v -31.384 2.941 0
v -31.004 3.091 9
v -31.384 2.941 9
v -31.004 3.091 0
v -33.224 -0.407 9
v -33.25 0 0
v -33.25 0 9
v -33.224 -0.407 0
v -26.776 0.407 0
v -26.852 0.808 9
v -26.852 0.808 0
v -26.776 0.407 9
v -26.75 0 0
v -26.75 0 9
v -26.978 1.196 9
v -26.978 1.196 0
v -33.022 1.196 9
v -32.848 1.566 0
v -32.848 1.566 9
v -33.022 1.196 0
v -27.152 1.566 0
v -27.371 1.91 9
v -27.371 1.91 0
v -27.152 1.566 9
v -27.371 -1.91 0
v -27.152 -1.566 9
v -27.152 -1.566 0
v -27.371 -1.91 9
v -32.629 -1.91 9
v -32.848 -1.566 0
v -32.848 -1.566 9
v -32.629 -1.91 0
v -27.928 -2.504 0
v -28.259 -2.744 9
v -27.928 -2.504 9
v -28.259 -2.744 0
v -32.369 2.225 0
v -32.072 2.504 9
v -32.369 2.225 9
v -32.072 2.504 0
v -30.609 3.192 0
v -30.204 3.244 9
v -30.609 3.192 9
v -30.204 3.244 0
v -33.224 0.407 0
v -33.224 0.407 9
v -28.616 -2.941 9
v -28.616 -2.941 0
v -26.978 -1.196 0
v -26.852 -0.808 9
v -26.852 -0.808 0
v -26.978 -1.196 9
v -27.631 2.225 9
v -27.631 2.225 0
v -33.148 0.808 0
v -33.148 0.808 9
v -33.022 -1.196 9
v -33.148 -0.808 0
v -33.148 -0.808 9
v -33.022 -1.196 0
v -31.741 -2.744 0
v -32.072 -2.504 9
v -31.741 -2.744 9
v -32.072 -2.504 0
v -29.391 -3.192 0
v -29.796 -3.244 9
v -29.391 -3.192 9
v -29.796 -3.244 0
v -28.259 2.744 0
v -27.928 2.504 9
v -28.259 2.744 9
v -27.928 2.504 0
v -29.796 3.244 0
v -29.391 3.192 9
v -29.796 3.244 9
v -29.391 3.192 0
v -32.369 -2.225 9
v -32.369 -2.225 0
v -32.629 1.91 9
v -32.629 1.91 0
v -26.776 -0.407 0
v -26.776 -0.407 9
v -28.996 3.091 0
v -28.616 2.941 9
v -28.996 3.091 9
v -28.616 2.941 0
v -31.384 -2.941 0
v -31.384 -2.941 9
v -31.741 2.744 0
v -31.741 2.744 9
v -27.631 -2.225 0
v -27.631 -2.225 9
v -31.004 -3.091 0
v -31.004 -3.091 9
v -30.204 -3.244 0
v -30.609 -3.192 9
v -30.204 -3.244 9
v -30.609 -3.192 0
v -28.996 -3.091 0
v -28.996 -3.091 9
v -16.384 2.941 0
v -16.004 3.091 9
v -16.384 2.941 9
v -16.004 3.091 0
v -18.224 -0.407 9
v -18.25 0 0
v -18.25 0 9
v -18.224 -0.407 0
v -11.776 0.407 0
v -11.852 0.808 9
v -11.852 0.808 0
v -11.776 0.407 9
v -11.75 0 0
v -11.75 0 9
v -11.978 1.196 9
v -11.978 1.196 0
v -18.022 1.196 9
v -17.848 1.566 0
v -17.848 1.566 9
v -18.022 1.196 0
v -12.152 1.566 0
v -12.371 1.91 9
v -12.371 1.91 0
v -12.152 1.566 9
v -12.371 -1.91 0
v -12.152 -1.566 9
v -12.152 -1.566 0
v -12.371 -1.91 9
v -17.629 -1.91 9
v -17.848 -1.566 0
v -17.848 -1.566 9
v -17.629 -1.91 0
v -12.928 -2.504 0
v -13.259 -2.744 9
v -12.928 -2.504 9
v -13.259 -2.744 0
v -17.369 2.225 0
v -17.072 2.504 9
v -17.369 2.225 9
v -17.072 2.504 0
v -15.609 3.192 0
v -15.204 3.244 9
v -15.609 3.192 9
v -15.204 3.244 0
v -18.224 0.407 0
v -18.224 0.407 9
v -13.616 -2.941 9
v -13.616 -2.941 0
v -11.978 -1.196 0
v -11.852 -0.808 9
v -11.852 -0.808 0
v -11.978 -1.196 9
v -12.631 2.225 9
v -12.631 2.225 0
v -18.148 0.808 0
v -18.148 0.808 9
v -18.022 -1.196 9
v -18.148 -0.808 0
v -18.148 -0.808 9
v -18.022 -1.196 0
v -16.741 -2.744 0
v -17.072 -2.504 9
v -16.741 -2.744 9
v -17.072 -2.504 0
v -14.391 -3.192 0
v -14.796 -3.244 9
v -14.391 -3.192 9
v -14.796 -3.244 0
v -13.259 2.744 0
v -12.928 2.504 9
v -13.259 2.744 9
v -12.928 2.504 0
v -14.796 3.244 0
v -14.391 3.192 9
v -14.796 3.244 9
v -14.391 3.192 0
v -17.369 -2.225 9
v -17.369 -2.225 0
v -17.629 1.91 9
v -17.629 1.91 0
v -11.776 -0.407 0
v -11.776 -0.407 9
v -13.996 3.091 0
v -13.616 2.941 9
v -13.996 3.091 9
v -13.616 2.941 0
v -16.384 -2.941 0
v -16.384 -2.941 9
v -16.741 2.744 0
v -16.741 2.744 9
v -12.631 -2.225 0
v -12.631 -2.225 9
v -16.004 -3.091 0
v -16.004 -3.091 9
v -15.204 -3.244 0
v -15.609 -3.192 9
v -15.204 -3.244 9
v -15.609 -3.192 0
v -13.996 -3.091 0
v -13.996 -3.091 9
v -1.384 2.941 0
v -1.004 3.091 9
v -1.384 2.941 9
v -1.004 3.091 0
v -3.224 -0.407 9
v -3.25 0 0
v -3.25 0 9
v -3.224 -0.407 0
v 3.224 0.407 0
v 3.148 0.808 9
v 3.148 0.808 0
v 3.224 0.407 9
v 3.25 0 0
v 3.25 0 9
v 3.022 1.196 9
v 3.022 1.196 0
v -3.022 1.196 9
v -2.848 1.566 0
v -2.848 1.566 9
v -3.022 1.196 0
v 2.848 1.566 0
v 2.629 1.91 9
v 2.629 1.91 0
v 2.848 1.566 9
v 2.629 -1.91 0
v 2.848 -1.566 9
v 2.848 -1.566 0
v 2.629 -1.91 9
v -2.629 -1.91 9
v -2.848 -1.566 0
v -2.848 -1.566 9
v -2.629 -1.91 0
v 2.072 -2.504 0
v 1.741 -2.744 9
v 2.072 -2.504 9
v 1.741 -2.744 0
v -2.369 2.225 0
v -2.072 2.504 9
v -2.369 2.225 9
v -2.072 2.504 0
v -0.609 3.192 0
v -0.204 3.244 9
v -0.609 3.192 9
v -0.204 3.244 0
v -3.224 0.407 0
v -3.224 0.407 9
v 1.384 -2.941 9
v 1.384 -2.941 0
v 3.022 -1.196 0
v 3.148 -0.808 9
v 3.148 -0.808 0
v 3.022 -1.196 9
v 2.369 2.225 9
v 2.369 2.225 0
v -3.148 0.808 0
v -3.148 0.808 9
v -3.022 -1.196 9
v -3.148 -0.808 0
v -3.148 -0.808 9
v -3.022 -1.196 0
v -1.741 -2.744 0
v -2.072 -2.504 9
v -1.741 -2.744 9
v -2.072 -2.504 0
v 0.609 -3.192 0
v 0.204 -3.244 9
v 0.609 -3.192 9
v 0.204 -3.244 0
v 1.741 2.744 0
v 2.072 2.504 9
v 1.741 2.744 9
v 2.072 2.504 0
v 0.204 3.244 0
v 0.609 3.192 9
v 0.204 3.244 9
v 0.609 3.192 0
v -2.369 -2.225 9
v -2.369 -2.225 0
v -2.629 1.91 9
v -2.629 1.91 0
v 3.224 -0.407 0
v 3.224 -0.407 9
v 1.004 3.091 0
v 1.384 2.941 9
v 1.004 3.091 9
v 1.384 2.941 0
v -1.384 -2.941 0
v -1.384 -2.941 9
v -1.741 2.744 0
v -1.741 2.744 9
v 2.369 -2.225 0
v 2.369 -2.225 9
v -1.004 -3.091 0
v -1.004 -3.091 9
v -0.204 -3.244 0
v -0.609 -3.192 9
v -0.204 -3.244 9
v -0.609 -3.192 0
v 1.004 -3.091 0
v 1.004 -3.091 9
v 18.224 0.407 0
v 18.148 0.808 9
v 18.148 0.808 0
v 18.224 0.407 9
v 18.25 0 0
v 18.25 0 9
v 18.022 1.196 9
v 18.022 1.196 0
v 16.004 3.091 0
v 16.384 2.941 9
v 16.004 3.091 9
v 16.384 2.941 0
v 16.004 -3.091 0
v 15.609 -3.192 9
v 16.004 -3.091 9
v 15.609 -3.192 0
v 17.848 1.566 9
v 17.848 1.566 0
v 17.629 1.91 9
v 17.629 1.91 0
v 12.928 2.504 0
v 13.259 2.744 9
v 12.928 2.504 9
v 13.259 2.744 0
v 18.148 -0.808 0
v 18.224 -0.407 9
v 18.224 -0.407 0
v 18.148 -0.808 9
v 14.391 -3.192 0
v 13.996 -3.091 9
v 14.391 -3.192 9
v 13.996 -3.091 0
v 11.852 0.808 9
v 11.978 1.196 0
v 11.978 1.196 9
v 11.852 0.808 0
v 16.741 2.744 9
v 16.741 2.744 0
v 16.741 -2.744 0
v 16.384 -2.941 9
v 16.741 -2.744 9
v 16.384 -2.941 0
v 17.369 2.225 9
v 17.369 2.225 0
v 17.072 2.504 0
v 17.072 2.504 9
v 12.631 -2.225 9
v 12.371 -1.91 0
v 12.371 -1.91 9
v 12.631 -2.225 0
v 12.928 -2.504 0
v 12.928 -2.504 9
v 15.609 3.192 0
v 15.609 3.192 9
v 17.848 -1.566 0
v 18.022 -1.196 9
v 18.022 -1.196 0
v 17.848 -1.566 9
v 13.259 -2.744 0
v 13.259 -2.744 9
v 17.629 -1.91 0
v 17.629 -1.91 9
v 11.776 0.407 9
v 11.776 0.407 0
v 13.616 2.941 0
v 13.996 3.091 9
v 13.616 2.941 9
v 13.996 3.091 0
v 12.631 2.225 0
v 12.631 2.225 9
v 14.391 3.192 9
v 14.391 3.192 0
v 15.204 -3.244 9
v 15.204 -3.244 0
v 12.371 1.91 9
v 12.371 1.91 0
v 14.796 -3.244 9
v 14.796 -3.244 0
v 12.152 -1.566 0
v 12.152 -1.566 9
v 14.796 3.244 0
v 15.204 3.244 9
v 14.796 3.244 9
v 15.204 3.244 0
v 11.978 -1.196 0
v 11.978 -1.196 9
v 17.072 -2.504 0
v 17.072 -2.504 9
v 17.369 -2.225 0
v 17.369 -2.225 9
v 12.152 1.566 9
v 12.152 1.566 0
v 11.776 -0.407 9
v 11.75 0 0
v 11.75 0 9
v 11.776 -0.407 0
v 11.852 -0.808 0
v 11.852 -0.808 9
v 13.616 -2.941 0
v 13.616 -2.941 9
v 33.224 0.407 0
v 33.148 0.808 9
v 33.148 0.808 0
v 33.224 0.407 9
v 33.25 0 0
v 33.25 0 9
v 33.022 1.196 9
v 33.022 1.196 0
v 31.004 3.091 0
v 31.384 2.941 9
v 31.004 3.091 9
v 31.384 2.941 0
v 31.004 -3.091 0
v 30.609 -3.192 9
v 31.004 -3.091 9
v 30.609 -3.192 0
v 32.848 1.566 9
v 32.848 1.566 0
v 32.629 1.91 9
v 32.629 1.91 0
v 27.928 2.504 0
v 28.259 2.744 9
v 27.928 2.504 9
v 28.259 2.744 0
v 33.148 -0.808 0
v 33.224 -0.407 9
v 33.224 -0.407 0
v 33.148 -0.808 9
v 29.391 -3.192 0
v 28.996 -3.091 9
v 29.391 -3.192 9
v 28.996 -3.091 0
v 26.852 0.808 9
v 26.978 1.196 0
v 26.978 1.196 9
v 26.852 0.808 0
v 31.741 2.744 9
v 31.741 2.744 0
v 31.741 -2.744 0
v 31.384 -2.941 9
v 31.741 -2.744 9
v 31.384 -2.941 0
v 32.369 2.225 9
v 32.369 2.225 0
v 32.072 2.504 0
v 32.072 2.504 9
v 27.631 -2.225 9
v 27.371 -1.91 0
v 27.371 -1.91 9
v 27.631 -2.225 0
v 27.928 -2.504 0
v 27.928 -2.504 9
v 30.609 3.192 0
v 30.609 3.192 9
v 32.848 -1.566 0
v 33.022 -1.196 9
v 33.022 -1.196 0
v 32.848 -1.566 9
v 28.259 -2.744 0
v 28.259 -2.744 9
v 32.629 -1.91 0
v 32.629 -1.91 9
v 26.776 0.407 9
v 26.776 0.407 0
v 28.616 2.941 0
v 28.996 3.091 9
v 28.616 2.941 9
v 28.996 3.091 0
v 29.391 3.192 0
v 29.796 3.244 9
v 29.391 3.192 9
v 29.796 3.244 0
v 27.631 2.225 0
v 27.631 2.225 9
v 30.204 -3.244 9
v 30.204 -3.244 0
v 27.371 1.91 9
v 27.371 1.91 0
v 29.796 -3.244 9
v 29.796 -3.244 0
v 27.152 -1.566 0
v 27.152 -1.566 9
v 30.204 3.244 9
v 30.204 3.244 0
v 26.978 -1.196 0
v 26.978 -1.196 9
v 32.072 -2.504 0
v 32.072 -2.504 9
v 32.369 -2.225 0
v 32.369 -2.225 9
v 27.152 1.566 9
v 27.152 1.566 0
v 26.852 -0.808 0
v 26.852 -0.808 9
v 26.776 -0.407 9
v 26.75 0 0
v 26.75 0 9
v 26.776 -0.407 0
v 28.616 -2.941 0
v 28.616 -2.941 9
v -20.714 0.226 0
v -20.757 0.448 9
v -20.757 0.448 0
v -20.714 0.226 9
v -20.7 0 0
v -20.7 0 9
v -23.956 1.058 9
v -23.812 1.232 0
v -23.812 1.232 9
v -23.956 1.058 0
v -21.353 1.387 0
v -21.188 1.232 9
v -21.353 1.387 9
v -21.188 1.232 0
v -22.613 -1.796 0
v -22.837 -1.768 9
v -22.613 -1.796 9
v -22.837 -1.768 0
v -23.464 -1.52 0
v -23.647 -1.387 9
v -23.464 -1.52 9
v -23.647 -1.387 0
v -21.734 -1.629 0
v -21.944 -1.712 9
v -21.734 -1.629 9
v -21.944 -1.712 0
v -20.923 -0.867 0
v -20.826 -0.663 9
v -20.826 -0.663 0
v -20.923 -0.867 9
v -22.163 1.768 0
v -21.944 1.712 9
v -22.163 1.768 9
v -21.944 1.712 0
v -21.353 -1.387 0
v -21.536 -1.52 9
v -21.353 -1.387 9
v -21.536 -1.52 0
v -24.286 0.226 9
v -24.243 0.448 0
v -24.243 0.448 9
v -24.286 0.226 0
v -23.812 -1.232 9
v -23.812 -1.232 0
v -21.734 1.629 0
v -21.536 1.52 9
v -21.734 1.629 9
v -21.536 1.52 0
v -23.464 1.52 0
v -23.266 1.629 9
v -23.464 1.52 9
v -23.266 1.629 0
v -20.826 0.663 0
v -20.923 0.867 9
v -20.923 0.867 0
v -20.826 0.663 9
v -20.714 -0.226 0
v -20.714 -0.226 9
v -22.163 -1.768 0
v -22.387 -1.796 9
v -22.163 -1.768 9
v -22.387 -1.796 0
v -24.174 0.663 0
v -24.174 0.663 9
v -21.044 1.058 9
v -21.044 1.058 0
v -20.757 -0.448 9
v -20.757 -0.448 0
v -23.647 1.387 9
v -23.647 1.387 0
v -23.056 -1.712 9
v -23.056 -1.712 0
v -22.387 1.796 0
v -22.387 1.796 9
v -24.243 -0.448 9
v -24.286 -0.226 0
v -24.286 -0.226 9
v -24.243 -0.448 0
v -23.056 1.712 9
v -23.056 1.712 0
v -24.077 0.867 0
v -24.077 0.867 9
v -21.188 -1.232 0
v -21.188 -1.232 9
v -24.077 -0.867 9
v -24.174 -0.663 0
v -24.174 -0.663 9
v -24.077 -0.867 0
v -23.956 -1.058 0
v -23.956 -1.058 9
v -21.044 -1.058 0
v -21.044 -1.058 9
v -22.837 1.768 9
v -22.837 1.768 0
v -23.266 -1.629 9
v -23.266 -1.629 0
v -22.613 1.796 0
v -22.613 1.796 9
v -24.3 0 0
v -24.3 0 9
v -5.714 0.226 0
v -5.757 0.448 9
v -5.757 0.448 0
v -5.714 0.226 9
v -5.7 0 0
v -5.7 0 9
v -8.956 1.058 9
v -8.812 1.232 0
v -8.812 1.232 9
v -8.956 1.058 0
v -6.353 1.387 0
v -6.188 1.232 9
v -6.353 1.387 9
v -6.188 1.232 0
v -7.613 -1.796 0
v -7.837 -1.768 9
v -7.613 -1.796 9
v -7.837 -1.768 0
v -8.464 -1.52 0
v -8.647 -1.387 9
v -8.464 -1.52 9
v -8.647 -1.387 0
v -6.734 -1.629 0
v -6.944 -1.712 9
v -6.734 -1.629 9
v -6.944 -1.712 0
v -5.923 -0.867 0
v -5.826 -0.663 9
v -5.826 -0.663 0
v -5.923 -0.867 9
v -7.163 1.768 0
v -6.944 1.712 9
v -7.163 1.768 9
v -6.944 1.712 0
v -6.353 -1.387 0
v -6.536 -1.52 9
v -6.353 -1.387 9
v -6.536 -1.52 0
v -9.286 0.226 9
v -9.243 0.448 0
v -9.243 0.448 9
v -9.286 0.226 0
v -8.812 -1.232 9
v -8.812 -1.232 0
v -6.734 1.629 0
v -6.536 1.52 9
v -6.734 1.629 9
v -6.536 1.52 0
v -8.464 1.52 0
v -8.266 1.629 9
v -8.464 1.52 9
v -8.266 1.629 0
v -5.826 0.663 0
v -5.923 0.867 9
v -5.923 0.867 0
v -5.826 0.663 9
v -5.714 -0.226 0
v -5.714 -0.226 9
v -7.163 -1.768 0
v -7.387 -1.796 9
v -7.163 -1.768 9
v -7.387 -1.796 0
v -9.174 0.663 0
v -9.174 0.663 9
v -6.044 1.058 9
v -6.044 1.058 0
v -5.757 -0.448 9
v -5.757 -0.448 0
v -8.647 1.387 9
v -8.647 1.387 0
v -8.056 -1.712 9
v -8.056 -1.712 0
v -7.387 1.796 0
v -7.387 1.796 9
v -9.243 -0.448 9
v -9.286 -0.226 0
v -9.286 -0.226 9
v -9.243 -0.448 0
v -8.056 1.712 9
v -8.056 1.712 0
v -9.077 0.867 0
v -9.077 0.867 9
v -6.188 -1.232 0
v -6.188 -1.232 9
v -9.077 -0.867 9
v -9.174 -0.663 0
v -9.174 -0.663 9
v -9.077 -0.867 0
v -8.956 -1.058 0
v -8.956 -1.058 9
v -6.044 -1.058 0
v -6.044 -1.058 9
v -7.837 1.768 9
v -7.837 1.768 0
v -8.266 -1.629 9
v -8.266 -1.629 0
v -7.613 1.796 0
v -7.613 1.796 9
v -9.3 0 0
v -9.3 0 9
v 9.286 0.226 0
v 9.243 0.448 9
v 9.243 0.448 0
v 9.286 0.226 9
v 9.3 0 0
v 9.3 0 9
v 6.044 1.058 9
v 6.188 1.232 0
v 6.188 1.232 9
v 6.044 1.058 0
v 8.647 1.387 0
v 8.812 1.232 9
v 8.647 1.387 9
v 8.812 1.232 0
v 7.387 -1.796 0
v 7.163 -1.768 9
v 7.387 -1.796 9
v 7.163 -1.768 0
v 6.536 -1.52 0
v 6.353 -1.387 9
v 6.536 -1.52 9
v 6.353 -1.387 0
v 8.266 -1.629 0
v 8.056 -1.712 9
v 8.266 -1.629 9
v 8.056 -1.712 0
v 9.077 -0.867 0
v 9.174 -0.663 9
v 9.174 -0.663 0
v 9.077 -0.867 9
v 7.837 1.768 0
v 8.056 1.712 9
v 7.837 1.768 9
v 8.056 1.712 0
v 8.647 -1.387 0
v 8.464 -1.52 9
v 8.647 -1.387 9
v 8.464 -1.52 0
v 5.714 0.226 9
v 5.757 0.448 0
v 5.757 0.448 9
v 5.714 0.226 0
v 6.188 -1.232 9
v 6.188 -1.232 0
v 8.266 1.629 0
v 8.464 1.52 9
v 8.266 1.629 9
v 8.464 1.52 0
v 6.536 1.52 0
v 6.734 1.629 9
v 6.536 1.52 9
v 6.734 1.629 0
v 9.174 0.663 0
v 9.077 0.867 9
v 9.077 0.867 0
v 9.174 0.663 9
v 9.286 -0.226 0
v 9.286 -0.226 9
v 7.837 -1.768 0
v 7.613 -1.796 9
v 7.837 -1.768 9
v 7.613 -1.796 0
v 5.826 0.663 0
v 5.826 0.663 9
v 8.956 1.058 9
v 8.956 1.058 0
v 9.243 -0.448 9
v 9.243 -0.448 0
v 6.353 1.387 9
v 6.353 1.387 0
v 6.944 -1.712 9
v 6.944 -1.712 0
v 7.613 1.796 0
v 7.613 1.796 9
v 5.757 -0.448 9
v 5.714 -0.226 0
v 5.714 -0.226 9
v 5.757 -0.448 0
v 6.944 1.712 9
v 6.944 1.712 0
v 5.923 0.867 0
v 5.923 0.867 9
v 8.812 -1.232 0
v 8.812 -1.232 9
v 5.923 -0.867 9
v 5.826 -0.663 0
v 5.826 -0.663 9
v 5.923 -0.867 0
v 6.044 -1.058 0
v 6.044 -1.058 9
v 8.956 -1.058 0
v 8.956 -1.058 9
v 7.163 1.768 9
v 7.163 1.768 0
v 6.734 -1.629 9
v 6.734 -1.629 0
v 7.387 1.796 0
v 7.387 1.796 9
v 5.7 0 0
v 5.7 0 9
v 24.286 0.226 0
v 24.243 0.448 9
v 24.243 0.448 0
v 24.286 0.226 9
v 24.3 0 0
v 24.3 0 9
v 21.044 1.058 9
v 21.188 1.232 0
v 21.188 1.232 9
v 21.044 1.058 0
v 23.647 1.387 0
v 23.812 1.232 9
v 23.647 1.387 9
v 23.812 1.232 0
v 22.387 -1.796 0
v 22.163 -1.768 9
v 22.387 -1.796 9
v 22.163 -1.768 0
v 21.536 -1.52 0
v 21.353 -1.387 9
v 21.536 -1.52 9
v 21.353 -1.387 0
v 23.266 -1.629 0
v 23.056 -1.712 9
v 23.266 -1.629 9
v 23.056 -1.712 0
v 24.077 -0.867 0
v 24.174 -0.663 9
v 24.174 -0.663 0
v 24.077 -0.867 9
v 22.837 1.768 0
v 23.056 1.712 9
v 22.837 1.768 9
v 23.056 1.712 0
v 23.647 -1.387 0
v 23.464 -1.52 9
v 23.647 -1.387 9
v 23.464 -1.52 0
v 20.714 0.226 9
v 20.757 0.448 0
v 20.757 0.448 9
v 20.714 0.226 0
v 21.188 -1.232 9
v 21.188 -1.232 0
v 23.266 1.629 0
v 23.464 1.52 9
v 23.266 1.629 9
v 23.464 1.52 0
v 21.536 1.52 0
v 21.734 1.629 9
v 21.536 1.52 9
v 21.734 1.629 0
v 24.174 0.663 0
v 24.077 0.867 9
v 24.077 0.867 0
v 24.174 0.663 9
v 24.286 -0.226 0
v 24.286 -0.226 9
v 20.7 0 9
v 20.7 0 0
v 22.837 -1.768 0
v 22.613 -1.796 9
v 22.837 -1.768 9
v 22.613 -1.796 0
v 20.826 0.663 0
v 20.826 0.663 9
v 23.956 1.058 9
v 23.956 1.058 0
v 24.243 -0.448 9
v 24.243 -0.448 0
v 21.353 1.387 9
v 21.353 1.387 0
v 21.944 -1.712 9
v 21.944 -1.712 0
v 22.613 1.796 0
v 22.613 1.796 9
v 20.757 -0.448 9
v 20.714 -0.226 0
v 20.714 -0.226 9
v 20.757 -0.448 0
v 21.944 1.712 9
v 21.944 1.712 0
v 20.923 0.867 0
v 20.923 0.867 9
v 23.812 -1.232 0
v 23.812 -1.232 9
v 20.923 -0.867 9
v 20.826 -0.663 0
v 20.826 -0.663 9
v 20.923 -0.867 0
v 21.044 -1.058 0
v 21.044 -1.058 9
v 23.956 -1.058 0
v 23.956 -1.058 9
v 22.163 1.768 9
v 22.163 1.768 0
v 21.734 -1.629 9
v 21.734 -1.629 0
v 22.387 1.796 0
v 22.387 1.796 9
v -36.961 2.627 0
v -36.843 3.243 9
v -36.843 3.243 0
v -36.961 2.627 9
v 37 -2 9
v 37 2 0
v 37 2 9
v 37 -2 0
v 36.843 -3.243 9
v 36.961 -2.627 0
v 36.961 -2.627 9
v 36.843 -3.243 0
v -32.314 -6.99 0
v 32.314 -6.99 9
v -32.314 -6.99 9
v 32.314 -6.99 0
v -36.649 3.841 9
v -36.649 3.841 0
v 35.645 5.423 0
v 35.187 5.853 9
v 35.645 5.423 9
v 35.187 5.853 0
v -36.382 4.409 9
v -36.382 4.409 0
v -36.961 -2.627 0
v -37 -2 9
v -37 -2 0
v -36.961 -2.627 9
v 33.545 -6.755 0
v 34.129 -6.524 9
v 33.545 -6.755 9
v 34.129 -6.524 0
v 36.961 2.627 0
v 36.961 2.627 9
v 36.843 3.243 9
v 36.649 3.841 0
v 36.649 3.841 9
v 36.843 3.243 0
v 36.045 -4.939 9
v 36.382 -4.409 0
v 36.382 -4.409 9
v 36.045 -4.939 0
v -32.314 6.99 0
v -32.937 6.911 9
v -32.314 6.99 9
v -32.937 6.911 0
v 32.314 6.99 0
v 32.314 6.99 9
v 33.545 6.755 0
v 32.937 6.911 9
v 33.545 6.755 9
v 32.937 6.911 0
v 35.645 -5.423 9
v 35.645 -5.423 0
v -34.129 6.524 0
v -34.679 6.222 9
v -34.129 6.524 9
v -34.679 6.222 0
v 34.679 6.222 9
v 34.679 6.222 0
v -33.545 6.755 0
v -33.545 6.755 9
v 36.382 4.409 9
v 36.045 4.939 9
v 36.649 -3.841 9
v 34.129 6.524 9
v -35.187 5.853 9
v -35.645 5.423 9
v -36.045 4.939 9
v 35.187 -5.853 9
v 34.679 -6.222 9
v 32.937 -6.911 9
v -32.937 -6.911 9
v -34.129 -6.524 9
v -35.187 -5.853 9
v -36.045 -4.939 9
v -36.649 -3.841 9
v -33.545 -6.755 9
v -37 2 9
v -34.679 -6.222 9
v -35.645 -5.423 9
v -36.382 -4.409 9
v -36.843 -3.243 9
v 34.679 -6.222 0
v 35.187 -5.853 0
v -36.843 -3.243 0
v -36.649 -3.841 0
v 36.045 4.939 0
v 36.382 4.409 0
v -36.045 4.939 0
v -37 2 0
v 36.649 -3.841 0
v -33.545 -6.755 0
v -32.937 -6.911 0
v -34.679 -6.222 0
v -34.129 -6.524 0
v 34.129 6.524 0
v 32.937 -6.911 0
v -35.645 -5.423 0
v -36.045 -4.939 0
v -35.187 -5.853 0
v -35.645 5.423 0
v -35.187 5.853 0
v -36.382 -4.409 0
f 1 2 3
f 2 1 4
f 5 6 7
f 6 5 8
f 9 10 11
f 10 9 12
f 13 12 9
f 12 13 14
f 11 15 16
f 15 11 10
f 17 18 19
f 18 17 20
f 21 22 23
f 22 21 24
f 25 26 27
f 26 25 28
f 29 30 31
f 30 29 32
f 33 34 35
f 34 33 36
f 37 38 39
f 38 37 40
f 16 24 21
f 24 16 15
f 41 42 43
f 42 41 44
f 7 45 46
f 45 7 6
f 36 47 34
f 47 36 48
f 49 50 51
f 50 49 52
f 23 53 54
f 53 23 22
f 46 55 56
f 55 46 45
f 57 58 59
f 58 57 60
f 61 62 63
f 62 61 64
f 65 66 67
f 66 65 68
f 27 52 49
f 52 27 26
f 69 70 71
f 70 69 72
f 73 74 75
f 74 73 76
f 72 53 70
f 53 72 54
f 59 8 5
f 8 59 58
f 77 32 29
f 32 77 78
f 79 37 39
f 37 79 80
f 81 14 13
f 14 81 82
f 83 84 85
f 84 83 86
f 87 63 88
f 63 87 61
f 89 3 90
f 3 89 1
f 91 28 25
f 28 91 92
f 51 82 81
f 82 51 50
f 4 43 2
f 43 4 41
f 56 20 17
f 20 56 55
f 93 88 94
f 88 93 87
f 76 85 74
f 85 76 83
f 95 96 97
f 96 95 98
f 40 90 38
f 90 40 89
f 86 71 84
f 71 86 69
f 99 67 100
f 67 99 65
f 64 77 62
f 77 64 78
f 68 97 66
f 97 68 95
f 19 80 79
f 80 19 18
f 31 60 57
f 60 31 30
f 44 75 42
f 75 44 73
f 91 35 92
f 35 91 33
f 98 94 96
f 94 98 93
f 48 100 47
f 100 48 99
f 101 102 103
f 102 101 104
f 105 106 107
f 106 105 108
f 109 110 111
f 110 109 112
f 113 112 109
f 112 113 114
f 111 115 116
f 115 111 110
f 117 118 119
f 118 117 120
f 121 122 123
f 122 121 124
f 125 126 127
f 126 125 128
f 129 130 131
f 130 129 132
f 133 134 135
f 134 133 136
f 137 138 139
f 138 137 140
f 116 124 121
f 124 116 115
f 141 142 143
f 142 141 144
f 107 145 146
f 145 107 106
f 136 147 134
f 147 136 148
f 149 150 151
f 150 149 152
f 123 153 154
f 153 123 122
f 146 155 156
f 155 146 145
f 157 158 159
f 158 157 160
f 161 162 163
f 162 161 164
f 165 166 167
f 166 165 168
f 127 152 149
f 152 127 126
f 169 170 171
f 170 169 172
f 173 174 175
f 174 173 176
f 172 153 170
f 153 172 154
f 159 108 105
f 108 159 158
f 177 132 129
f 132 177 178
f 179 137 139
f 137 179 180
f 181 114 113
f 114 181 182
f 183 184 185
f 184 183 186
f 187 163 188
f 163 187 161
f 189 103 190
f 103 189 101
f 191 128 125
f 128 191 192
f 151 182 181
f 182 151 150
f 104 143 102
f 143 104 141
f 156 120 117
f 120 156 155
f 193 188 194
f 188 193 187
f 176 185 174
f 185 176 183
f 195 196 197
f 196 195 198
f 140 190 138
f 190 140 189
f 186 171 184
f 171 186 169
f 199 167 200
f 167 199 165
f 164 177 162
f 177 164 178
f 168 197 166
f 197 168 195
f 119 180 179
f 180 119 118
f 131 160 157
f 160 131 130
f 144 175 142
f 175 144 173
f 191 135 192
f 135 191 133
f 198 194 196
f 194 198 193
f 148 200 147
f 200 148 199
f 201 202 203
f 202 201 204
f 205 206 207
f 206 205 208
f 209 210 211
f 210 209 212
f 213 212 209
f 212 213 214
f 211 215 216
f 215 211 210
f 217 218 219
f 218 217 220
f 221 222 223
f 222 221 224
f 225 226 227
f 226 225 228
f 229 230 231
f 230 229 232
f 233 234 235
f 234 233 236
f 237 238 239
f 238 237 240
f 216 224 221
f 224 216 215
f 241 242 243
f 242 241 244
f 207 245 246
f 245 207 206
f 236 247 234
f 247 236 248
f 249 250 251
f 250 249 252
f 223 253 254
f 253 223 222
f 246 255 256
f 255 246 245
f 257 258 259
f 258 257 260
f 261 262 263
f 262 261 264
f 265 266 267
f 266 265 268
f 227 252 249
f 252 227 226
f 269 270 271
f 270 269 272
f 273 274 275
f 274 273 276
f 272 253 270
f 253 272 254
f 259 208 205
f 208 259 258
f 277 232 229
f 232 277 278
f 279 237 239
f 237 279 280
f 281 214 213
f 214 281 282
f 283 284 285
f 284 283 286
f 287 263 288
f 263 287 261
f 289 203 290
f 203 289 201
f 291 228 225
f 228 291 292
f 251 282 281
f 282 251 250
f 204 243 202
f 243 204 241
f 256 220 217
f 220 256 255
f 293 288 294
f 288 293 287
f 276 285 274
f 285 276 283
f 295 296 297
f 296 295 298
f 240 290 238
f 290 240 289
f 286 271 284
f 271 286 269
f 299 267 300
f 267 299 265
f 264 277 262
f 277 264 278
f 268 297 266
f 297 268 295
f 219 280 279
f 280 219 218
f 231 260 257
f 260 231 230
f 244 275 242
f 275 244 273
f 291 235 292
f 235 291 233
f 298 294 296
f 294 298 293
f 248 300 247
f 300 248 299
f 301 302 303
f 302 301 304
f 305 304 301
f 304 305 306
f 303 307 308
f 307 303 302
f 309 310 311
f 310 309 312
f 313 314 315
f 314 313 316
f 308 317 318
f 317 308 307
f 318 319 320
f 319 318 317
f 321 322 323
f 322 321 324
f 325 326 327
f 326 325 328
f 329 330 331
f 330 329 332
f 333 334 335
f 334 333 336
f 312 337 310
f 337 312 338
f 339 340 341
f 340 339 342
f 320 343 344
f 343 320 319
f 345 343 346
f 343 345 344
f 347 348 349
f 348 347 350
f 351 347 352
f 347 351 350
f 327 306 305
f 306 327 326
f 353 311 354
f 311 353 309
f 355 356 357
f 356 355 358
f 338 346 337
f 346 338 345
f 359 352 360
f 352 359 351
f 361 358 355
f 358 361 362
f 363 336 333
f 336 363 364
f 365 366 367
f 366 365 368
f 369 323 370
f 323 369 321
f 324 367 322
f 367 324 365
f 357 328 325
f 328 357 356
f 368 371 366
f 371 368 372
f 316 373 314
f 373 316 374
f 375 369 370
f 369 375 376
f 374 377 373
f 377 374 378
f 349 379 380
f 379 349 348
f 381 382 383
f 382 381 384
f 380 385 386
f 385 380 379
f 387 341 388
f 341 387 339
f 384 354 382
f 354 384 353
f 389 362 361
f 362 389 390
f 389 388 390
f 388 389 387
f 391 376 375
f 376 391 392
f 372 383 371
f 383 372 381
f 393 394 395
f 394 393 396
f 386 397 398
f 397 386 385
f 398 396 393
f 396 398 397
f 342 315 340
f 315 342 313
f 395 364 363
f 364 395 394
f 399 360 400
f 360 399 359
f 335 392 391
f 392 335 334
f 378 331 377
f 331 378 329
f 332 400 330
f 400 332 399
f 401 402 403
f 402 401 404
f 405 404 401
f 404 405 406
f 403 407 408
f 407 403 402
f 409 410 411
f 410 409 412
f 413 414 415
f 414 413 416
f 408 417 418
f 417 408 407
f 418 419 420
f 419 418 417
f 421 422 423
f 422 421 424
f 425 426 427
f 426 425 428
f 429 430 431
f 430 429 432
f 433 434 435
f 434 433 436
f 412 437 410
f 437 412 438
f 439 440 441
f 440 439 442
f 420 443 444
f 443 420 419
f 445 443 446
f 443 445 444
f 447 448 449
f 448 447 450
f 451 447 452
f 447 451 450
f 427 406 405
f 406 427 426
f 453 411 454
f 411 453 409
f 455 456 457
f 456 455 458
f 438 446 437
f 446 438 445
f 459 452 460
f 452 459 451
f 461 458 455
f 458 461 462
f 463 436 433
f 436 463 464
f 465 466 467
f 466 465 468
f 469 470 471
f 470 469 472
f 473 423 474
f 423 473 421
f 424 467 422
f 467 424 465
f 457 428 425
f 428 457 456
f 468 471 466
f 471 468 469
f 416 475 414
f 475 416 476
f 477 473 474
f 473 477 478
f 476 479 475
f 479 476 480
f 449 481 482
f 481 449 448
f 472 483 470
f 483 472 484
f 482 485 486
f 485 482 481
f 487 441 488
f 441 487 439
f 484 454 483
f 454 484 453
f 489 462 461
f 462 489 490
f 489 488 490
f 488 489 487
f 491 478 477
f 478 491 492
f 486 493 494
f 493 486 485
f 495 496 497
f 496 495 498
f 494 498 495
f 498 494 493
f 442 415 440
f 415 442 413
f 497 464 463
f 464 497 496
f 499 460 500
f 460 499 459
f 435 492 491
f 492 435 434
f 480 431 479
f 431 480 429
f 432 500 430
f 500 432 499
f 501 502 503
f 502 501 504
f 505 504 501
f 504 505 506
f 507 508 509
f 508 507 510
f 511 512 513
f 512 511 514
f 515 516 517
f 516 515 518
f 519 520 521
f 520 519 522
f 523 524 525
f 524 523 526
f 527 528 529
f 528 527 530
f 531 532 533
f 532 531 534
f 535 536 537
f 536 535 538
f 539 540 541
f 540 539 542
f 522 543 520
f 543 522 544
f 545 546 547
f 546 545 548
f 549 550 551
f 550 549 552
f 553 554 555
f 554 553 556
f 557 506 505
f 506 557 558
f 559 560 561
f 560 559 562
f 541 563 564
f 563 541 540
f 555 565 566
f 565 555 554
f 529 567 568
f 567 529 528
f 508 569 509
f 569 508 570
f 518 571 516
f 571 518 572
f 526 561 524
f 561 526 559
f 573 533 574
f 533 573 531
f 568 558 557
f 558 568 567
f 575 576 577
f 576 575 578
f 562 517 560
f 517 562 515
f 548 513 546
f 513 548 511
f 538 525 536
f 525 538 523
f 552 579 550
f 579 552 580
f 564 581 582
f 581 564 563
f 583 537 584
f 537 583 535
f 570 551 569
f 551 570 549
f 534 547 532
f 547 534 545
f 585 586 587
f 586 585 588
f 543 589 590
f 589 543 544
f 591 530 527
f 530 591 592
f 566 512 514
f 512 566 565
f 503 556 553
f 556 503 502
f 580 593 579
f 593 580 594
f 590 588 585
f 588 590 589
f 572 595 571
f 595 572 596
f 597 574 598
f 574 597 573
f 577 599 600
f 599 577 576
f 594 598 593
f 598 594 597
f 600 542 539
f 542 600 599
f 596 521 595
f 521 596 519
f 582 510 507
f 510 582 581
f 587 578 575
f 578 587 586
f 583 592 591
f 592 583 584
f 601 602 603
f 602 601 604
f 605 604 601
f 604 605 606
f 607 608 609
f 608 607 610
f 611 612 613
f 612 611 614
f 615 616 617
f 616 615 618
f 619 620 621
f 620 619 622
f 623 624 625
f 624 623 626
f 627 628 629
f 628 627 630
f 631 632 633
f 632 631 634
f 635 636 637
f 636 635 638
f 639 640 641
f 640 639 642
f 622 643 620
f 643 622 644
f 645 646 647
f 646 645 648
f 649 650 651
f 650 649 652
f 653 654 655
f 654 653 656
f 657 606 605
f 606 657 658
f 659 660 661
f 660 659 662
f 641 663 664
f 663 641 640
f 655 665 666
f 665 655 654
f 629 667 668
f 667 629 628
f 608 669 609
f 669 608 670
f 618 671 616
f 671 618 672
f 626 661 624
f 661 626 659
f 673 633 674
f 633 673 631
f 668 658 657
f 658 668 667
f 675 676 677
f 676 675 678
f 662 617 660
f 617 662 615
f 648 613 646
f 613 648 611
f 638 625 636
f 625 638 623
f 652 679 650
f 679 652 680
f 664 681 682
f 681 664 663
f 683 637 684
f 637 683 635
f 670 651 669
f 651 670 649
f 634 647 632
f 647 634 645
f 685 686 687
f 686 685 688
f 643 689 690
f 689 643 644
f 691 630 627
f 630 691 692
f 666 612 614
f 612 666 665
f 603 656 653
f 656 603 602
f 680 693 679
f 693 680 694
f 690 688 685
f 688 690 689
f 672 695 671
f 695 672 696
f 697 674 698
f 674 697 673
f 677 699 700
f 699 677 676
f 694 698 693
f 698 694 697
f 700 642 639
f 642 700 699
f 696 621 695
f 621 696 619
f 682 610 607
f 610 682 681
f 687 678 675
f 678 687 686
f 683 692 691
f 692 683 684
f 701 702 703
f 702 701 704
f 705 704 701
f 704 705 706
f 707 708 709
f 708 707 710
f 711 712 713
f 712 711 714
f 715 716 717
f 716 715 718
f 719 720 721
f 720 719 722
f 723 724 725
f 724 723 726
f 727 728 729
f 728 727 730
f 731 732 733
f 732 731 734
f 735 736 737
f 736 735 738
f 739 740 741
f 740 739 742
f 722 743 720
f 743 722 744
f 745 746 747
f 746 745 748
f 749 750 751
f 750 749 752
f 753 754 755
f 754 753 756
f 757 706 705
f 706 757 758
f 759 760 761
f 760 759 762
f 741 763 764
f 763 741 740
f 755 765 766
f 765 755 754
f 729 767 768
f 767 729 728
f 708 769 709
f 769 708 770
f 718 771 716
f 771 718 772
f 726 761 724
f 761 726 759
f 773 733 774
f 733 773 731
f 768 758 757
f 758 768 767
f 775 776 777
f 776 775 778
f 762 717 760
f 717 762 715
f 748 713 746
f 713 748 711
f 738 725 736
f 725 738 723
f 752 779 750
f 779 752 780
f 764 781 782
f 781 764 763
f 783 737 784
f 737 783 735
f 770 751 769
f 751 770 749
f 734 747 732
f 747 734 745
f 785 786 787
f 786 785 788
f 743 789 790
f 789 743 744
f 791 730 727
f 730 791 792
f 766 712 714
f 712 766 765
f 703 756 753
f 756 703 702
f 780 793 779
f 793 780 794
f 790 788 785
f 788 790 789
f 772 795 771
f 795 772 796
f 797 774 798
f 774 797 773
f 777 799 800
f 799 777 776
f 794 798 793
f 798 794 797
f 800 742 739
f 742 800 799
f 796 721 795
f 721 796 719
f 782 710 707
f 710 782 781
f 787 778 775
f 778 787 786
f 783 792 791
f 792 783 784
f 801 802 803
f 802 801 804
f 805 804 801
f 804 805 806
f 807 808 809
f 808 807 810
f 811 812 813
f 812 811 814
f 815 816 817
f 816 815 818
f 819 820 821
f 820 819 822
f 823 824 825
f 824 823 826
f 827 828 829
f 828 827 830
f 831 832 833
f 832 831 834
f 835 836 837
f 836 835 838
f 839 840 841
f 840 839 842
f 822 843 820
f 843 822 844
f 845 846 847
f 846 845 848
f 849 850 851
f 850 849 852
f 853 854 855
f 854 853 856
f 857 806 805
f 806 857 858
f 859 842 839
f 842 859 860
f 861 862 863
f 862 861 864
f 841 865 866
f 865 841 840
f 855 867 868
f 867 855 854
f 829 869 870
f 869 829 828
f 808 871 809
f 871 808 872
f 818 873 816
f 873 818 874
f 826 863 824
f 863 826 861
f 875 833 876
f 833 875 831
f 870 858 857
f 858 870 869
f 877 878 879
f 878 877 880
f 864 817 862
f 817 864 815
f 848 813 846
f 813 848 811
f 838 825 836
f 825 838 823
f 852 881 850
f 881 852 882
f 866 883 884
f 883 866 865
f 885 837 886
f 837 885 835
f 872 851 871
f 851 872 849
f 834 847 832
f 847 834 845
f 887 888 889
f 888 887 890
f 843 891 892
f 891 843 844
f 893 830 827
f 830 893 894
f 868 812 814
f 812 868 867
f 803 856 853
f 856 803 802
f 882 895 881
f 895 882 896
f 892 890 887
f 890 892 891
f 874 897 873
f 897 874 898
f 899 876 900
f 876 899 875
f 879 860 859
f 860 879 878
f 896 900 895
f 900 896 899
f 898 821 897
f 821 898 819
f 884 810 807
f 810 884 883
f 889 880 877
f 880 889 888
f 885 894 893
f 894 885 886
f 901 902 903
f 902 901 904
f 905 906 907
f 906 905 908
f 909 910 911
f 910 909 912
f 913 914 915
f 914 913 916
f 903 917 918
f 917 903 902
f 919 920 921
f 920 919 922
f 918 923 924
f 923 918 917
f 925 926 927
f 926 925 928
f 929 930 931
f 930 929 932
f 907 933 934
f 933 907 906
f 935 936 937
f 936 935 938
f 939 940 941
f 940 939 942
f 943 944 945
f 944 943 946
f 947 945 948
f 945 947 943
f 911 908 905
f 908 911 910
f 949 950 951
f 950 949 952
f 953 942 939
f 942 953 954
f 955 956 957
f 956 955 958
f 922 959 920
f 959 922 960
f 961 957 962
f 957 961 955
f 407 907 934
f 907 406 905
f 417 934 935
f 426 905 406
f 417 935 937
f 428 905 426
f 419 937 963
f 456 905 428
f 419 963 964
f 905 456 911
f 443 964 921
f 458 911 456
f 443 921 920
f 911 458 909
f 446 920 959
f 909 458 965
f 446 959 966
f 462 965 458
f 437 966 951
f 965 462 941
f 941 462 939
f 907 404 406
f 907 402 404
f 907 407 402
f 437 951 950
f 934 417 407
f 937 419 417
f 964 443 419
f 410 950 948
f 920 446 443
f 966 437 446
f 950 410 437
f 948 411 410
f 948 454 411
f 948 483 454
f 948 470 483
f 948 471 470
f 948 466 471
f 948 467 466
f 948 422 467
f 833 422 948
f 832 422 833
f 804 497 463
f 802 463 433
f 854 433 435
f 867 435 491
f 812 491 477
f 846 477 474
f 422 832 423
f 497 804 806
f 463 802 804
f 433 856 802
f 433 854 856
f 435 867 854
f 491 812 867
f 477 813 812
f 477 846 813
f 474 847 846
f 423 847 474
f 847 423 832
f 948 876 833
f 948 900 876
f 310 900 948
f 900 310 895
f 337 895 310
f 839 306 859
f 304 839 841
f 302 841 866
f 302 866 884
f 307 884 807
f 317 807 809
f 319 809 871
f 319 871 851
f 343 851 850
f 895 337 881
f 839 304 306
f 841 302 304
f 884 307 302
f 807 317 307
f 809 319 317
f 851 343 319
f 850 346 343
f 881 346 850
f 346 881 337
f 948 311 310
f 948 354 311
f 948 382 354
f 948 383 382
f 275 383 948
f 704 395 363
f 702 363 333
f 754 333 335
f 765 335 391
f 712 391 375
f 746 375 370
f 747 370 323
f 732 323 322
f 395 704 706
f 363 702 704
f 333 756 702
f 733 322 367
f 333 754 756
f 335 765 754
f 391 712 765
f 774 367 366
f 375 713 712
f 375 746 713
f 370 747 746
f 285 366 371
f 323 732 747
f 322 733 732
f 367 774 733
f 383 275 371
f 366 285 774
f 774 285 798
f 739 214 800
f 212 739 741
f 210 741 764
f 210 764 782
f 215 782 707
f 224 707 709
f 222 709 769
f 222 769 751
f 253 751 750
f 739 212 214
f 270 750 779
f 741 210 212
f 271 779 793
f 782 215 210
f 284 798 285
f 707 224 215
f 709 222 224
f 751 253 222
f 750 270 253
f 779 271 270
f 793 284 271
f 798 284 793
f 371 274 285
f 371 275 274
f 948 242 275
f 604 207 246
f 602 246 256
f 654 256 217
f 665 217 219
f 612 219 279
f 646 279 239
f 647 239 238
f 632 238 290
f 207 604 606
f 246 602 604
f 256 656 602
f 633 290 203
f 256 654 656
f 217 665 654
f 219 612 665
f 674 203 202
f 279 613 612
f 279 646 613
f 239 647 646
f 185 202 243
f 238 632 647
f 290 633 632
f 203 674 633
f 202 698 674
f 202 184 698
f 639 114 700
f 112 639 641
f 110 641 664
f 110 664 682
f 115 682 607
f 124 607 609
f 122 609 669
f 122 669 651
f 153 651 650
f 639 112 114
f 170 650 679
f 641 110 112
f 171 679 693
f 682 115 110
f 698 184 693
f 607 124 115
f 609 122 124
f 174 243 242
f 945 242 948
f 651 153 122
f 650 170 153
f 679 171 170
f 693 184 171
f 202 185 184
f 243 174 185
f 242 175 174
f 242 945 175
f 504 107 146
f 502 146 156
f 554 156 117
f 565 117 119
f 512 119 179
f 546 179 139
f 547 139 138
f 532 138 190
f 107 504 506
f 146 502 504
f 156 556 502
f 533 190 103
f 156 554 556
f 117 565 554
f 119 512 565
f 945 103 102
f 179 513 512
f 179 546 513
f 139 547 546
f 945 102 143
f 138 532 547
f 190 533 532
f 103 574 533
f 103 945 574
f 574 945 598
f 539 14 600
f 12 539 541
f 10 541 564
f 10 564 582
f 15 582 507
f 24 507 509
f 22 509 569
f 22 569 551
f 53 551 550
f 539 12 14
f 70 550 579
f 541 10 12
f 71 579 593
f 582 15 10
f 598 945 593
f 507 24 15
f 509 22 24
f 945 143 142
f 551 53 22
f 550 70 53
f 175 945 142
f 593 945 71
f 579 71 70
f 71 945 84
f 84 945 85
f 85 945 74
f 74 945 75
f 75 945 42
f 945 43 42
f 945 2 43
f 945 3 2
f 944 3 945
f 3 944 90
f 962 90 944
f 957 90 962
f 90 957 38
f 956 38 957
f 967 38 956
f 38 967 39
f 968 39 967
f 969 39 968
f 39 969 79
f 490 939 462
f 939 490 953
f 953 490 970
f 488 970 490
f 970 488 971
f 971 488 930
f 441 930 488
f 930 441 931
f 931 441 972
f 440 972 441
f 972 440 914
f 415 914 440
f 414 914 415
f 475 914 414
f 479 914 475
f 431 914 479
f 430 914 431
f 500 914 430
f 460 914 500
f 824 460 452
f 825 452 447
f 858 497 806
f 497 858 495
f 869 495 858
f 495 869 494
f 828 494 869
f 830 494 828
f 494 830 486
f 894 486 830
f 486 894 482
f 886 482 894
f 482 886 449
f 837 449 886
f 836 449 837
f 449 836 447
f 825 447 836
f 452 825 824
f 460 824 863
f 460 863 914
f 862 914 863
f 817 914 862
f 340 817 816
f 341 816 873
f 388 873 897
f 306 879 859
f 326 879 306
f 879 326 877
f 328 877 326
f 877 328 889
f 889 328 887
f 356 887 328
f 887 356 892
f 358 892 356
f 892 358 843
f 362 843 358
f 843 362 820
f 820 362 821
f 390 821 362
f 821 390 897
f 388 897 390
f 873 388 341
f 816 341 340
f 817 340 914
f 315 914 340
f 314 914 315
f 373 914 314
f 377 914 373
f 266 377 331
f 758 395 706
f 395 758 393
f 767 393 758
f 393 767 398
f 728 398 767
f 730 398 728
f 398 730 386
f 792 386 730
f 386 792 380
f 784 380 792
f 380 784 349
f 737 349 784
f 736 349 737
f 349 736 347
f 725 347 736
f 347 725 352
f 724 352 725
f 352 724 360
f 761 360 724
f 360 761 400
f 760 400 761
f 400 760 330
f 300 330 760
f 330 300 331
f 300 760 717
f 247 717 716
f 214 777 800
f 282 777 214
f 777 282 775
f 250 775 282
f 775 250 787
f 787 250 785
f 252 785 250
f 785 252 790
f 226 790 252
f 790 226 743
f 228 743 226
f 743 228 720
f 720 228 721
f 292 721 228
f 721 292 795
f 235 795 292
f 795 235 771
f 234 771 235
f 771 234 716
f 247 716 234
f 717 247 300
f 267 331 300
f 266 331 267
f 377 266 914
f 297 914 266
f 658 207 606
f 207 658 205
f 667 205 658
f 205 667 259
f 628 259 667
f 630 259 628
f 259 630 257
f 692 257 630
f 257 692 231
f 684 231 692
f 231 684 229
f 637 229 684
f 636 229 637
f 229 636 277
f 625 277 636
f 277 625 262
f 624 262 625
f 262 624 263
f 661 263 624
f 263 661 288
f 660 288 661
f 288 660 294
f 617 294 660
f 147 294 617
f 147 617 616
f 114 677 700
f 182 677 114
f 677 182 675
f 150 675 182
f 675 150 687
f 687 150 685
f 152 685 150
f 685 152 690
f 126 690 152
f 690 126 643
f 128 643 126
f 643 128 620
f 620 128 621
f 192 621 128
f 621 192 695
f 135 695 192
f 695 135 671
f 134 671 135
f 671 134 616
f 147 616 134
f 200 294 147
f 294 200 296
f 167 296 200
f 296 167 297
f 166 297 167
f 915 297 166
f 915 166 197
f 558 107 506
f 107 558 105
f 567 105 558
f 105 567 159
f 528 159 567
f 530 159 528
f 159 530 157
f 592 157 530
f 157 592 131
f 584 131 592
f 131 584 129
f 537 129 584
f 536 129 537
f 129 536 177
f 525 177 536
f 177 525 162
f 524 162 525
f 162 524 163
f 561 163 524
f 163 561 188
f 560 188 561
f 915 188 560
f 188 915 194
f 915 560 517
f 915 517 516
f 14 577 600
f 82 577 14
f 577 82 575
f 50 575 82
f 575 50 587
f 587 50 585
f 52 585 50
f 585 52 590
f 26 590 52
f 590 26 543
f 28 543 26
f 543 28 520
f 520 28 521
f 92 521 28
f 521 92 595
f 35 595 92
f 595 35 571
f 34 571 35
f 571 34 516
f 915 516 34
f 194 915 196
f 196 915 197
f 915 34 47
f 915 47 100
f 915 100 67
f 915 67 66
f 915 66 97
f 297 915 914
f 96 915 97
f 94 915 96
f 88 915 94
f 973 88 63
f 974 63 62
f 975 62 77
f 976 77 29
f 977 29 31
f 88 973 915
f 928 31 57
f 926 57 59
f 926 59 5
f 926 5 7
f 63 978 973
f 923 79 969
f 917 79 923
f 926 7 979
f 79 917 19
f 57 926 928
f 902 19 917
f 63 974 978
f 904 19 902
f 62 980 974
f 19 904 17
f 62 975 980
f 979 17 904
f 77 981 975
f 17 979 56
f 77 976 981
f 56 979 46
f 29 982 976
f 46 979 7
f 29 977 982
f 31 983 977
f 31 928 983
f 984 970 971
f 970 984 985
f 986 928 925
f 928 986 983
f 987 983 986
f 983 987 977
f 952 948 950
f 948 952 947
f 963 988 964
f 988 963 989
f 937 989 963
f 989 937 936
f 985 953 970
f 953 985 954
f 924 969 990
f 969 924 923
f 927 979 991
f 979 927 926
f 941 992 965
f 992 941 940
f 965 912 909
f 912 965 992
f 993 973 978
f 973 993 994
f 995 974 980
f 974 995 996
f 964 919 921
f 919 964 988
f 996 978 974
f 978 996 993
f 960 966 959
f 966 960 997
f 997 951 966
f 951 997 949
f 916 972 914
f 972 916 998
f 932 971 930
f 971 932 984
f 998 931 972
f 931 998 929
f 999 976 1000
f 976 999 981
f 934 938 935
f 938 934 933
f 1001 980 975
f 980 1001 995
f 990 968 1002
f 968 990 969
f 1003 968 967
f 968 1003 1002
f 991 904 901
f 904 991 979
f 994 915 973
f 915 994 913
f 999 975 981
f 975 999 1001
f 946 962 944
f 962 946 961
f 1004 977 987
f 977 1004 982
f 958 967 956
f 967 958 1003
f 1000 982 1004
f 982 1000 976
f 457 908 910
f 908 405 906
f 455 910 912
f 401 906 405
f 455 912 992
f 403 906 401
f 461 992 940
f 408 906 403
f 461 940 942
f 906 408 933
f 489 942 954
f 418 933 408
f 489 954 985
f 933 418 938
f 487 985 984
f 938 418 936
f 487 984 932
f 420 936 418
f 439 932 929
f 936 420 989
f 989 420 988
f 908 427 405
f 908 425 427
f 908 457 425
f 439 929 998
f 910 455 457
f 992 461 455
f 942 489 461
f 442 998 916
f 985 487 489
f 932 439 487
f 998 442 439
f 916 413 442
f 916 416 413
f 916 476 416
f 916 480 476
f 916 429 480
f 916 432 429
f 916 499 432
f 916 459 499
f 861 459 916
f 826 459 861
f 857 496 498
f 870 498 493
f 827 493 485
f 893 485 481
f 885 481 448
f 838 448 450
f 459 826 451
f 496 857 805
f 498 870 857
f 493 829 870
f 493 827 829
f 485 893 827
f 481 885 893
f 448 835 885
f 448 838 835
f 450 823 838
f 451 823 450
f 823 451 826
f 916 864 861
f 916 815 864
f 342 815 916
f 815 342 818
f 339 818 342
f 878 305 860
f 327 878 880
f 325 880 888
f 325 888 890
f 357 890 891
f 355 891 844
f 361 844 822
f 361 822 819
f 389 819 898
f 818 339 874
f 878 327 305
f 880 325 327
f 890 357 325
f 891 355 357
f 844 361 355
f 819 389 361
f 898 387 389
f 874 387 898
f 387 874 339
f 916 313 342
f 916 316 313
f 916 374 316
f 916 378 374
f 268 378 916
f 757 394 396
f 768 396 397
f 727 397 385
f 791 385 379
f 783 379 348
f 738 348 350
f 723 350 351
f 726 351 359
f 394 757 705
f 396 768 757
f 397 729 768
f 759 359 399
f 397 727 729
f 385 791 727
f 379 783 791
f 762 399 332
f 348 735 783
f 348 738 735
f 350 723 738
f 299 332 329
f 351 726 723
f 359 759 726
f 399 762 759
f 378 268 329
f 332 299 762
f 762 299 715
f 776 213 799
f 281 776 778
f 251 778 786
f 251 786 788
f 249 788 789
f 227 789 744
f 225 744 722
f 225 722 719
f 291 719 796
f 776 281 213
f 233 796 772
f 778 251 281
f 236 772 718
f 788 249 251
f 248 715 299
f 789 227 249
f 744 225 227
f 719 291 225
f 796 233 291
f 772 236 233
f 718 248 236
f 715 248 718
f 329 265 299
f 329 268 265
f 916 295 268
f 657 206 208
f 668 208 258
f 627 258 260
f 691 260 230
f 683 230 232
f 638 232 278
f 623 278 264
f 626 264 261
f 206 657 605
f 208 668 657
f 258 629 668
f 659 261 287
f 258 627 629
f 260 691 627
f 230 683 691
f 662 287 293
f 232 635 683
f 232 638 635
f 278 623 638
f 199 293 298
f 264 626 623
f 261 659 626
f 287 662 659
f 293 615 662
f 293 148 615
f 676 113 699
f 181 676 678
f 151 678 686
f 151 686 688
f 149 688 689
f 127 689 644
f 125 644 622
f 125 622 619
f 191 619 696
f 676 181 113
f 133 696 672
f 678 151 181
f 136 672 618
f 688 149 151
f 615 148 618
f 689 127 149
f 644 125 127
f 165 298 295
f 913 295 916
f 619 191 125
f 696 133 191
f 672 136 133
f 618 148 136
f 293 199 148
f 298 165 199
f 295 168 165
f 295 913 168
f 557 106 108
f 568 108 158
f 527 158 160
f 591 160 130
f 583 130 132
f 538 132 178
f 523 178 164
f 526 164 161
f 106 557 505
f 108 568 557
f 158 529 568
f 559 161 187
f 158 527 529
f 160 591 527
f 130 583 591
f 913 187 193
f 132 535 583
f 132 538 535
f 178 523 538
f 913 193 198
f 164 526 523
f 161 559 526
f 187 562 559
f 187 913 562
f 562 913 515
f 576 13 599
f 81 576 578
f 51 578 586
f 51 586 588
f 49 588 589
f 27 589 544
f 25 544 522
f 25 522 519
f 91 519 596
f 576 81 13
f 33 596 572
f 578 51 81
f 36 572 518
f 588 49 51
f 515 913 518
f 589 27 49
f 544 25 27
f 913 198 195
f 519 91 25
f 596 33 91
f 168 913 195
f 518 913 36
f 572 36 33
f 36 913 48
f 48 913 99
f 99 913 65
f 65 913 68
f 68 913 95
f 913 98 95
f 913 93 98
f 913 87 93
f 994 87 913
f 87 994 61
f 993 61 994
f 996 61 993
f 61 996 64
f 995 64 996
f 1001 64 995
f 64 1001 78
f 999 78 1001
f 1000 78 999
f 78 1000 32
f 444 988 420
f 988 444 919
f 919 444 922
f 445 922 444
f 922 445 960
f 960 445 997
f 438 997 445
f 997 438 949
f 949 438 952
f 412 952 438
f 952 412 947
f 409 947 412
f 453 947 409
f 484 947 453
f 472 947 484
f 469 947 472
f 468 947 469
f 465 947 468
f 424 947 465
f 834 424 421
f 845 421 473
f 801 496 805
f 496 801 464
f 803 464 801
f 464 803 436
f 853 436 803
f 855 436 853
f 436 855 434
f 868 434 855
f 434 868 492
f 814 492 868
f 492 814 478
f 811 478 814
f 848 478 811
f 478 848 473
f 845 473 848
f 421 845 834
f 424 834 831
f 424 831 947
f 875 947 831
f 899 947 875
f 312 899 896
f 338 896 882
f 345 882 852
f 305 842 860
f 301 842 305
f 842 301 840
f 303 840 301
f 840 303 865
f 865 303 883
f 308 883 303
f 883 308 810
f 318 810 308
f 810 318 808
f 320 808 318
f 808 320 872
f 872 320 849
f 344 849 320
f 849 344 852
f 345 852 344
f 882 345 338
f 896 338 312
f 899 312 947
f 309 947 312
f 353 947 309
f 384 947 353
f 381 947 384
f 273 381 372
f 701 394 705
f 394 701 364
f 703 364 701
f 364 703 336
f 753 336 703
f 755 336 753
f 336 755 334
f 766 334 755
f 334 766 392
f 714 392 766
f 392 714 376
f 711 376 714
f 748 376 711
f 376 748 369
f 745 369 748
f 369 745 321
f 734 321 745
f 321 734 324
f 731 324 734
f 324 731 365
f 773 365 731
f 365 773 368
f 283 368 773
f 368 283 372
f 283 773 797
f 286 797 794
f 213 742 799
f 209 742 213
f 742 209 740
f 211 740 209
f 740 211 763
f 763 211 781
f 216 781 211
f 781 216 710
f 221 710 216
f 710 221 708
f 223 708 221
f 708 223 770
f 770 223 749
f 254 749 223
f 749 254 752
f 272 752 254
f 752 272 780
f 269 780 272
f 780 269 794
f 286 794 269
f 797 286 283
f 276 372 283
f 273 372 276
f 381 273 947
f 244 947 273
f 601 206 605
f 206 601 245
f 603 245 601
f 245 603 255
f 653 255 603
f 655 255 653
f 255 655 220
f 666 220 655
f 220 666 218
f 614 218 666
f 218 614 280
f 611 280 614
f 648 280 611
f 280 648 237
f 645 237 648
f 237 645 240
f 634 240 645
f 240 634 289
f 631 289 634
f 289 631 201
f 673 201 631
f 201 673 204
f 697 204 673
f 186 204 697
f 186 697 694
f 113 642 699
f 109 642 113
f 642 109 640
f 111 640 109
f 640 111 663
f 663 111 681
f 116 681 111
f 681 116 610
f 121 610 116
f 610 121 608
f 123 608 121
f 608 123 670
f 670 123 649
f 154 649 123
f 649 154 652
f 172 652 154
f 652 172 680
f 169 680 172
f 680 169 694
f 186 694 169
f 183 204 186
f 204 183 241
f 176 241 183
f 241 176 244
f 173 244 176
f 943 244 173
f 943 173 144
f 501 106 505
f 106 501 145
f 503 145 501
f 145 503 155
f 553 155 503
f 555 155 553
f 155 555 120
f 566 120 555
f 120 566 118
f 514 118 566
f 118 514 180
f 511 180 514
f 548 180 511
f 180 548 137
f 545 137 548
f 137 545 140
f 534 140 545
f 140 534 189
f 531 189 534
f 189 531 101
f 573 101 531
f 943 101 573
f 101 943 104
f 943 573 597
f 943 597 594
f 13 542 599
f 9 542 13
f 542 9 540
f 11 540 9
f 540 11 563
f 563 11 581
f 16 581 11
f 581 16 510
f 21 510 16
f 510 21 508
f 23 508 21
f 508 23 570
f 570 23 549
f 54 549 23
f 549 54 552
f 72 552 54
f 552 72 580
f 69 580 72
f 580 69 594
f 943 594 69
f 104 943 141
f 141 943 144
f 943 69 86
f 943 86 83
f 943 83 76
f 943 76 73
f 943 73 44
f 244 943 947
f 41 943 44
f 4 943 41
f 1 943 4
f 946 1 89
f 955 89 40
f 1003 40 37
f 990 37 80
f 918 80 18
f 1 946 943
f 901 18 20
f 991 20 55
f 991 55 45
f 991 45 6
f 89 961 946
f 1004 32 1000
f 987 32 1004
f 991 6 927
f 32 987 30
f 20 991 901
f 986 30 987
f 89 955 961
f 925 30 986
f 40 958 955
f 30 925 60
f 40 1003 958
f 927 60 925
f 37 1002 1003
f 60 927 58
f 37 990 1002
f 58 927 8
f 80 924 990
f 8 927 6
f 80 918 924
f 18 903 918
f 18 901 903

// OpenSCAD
$fn = 50;


difference() {
	union() {
		hull() {
			translate(v = [-32.0000000000, 2.0000000000, 0]) {
				cylinder(h = 9, r = 5);
			}
			translate(v = [32.0000000000, 2.0000000000, 0]) {
				cylinder(h = 9, r = 5);
			}
			translate(v = [-32.0000000000, -2.0000000000, 0]) {
				cylinder(h = 9, r = 5);
			}
			translate(v = [32.0000000000, -2.0000000000, 0]) {
				cylinder(h = 9, r = 5);
			}
		}
	}
	union() {
		translate(v = [-30.0000000000, 0.0000000000, 0]) {
			translate(v = [0, 0, -100]) {
				cylinder(h = 200, r = 3.2500000000);
			}
		}
		translate(v = [-15.0000000000, 0.0000000000, 0]) {
			translate(v = [0, 0, -100]) {
				cylinder(h = 200, r = 3.2500000000);
			}
		}
		translate(v = [0, 0, -100]) {
			cylinder(h = 200, r = 3.2500000000);
		}
		translate(v = [15.0000000000, 0.0000000000, 0]) {
			translate(v = [0, 0, -100]) {
				cylinder(h = 200, r = 3.2500000000);
			}
		}
		translate(v = [30.0000000000, 0.0000000000, 0]) {
			translate(v = [0, 0, -100]) {
				cylinder(h = 200, r = 3.2500000000);
			}
		}
		translate(v = [-30.0000000000, 0.0000000000, 0]) {
			translate(v = [0, 0, -100]) {
				cylinder(h = 200, r = 1.8000000000);
			}
		}
		translate(v = [-22.5000000000, 0.0000000000, 0]) {
			translate(v = [0, 0, -100]) {
				cylinder(h = 200, r = 1.8000000000);
			}
		}
		translate(v = [-15.0000000000, 0.0000000000, 0]) {
			translate(v = [0, 0, -100]) {
				cylinder(h = 200, r = 1.8000000000);
			}
		}
		translate(v = [-7.5000000000, 0.0000000000, 0]) {
			translate(v = [0, 0, -100]) {
				cylinder(h = 200, r = 1.8000000000);
			}
		}
		translate(v = [0, 0, -100]) {
			cylinder(h = 200, r = 1.8000000000);
		}
		translate(v = [7.5000000000, 0.0000000000, 0]) {
			translate(v = [0, 0, -100]) {
				cylinder(h = 200, r = 1.8000000000);
			}
		}
		translate(v = [15.0000000000, 0.0000000000, 0]) {
			translate(v = [0, 0, -100]) {
				cylinder(h = 200, r = 1.8000000000);
			}
		}
		translate(v = [22.5000000000, 0.0000000000, 0]) {
			translate(v = [0, 0, -100]) {
				cylinder(h = 200, r = 1.8000000000);
			}
		}
		translate(v = [30.0000000000, 0.0000000000, 0]) {
			translate(v = [0, 0, -100]) {
				cylinder(h = 200, r = 1.8000000000);
			}
		}
	}
}
